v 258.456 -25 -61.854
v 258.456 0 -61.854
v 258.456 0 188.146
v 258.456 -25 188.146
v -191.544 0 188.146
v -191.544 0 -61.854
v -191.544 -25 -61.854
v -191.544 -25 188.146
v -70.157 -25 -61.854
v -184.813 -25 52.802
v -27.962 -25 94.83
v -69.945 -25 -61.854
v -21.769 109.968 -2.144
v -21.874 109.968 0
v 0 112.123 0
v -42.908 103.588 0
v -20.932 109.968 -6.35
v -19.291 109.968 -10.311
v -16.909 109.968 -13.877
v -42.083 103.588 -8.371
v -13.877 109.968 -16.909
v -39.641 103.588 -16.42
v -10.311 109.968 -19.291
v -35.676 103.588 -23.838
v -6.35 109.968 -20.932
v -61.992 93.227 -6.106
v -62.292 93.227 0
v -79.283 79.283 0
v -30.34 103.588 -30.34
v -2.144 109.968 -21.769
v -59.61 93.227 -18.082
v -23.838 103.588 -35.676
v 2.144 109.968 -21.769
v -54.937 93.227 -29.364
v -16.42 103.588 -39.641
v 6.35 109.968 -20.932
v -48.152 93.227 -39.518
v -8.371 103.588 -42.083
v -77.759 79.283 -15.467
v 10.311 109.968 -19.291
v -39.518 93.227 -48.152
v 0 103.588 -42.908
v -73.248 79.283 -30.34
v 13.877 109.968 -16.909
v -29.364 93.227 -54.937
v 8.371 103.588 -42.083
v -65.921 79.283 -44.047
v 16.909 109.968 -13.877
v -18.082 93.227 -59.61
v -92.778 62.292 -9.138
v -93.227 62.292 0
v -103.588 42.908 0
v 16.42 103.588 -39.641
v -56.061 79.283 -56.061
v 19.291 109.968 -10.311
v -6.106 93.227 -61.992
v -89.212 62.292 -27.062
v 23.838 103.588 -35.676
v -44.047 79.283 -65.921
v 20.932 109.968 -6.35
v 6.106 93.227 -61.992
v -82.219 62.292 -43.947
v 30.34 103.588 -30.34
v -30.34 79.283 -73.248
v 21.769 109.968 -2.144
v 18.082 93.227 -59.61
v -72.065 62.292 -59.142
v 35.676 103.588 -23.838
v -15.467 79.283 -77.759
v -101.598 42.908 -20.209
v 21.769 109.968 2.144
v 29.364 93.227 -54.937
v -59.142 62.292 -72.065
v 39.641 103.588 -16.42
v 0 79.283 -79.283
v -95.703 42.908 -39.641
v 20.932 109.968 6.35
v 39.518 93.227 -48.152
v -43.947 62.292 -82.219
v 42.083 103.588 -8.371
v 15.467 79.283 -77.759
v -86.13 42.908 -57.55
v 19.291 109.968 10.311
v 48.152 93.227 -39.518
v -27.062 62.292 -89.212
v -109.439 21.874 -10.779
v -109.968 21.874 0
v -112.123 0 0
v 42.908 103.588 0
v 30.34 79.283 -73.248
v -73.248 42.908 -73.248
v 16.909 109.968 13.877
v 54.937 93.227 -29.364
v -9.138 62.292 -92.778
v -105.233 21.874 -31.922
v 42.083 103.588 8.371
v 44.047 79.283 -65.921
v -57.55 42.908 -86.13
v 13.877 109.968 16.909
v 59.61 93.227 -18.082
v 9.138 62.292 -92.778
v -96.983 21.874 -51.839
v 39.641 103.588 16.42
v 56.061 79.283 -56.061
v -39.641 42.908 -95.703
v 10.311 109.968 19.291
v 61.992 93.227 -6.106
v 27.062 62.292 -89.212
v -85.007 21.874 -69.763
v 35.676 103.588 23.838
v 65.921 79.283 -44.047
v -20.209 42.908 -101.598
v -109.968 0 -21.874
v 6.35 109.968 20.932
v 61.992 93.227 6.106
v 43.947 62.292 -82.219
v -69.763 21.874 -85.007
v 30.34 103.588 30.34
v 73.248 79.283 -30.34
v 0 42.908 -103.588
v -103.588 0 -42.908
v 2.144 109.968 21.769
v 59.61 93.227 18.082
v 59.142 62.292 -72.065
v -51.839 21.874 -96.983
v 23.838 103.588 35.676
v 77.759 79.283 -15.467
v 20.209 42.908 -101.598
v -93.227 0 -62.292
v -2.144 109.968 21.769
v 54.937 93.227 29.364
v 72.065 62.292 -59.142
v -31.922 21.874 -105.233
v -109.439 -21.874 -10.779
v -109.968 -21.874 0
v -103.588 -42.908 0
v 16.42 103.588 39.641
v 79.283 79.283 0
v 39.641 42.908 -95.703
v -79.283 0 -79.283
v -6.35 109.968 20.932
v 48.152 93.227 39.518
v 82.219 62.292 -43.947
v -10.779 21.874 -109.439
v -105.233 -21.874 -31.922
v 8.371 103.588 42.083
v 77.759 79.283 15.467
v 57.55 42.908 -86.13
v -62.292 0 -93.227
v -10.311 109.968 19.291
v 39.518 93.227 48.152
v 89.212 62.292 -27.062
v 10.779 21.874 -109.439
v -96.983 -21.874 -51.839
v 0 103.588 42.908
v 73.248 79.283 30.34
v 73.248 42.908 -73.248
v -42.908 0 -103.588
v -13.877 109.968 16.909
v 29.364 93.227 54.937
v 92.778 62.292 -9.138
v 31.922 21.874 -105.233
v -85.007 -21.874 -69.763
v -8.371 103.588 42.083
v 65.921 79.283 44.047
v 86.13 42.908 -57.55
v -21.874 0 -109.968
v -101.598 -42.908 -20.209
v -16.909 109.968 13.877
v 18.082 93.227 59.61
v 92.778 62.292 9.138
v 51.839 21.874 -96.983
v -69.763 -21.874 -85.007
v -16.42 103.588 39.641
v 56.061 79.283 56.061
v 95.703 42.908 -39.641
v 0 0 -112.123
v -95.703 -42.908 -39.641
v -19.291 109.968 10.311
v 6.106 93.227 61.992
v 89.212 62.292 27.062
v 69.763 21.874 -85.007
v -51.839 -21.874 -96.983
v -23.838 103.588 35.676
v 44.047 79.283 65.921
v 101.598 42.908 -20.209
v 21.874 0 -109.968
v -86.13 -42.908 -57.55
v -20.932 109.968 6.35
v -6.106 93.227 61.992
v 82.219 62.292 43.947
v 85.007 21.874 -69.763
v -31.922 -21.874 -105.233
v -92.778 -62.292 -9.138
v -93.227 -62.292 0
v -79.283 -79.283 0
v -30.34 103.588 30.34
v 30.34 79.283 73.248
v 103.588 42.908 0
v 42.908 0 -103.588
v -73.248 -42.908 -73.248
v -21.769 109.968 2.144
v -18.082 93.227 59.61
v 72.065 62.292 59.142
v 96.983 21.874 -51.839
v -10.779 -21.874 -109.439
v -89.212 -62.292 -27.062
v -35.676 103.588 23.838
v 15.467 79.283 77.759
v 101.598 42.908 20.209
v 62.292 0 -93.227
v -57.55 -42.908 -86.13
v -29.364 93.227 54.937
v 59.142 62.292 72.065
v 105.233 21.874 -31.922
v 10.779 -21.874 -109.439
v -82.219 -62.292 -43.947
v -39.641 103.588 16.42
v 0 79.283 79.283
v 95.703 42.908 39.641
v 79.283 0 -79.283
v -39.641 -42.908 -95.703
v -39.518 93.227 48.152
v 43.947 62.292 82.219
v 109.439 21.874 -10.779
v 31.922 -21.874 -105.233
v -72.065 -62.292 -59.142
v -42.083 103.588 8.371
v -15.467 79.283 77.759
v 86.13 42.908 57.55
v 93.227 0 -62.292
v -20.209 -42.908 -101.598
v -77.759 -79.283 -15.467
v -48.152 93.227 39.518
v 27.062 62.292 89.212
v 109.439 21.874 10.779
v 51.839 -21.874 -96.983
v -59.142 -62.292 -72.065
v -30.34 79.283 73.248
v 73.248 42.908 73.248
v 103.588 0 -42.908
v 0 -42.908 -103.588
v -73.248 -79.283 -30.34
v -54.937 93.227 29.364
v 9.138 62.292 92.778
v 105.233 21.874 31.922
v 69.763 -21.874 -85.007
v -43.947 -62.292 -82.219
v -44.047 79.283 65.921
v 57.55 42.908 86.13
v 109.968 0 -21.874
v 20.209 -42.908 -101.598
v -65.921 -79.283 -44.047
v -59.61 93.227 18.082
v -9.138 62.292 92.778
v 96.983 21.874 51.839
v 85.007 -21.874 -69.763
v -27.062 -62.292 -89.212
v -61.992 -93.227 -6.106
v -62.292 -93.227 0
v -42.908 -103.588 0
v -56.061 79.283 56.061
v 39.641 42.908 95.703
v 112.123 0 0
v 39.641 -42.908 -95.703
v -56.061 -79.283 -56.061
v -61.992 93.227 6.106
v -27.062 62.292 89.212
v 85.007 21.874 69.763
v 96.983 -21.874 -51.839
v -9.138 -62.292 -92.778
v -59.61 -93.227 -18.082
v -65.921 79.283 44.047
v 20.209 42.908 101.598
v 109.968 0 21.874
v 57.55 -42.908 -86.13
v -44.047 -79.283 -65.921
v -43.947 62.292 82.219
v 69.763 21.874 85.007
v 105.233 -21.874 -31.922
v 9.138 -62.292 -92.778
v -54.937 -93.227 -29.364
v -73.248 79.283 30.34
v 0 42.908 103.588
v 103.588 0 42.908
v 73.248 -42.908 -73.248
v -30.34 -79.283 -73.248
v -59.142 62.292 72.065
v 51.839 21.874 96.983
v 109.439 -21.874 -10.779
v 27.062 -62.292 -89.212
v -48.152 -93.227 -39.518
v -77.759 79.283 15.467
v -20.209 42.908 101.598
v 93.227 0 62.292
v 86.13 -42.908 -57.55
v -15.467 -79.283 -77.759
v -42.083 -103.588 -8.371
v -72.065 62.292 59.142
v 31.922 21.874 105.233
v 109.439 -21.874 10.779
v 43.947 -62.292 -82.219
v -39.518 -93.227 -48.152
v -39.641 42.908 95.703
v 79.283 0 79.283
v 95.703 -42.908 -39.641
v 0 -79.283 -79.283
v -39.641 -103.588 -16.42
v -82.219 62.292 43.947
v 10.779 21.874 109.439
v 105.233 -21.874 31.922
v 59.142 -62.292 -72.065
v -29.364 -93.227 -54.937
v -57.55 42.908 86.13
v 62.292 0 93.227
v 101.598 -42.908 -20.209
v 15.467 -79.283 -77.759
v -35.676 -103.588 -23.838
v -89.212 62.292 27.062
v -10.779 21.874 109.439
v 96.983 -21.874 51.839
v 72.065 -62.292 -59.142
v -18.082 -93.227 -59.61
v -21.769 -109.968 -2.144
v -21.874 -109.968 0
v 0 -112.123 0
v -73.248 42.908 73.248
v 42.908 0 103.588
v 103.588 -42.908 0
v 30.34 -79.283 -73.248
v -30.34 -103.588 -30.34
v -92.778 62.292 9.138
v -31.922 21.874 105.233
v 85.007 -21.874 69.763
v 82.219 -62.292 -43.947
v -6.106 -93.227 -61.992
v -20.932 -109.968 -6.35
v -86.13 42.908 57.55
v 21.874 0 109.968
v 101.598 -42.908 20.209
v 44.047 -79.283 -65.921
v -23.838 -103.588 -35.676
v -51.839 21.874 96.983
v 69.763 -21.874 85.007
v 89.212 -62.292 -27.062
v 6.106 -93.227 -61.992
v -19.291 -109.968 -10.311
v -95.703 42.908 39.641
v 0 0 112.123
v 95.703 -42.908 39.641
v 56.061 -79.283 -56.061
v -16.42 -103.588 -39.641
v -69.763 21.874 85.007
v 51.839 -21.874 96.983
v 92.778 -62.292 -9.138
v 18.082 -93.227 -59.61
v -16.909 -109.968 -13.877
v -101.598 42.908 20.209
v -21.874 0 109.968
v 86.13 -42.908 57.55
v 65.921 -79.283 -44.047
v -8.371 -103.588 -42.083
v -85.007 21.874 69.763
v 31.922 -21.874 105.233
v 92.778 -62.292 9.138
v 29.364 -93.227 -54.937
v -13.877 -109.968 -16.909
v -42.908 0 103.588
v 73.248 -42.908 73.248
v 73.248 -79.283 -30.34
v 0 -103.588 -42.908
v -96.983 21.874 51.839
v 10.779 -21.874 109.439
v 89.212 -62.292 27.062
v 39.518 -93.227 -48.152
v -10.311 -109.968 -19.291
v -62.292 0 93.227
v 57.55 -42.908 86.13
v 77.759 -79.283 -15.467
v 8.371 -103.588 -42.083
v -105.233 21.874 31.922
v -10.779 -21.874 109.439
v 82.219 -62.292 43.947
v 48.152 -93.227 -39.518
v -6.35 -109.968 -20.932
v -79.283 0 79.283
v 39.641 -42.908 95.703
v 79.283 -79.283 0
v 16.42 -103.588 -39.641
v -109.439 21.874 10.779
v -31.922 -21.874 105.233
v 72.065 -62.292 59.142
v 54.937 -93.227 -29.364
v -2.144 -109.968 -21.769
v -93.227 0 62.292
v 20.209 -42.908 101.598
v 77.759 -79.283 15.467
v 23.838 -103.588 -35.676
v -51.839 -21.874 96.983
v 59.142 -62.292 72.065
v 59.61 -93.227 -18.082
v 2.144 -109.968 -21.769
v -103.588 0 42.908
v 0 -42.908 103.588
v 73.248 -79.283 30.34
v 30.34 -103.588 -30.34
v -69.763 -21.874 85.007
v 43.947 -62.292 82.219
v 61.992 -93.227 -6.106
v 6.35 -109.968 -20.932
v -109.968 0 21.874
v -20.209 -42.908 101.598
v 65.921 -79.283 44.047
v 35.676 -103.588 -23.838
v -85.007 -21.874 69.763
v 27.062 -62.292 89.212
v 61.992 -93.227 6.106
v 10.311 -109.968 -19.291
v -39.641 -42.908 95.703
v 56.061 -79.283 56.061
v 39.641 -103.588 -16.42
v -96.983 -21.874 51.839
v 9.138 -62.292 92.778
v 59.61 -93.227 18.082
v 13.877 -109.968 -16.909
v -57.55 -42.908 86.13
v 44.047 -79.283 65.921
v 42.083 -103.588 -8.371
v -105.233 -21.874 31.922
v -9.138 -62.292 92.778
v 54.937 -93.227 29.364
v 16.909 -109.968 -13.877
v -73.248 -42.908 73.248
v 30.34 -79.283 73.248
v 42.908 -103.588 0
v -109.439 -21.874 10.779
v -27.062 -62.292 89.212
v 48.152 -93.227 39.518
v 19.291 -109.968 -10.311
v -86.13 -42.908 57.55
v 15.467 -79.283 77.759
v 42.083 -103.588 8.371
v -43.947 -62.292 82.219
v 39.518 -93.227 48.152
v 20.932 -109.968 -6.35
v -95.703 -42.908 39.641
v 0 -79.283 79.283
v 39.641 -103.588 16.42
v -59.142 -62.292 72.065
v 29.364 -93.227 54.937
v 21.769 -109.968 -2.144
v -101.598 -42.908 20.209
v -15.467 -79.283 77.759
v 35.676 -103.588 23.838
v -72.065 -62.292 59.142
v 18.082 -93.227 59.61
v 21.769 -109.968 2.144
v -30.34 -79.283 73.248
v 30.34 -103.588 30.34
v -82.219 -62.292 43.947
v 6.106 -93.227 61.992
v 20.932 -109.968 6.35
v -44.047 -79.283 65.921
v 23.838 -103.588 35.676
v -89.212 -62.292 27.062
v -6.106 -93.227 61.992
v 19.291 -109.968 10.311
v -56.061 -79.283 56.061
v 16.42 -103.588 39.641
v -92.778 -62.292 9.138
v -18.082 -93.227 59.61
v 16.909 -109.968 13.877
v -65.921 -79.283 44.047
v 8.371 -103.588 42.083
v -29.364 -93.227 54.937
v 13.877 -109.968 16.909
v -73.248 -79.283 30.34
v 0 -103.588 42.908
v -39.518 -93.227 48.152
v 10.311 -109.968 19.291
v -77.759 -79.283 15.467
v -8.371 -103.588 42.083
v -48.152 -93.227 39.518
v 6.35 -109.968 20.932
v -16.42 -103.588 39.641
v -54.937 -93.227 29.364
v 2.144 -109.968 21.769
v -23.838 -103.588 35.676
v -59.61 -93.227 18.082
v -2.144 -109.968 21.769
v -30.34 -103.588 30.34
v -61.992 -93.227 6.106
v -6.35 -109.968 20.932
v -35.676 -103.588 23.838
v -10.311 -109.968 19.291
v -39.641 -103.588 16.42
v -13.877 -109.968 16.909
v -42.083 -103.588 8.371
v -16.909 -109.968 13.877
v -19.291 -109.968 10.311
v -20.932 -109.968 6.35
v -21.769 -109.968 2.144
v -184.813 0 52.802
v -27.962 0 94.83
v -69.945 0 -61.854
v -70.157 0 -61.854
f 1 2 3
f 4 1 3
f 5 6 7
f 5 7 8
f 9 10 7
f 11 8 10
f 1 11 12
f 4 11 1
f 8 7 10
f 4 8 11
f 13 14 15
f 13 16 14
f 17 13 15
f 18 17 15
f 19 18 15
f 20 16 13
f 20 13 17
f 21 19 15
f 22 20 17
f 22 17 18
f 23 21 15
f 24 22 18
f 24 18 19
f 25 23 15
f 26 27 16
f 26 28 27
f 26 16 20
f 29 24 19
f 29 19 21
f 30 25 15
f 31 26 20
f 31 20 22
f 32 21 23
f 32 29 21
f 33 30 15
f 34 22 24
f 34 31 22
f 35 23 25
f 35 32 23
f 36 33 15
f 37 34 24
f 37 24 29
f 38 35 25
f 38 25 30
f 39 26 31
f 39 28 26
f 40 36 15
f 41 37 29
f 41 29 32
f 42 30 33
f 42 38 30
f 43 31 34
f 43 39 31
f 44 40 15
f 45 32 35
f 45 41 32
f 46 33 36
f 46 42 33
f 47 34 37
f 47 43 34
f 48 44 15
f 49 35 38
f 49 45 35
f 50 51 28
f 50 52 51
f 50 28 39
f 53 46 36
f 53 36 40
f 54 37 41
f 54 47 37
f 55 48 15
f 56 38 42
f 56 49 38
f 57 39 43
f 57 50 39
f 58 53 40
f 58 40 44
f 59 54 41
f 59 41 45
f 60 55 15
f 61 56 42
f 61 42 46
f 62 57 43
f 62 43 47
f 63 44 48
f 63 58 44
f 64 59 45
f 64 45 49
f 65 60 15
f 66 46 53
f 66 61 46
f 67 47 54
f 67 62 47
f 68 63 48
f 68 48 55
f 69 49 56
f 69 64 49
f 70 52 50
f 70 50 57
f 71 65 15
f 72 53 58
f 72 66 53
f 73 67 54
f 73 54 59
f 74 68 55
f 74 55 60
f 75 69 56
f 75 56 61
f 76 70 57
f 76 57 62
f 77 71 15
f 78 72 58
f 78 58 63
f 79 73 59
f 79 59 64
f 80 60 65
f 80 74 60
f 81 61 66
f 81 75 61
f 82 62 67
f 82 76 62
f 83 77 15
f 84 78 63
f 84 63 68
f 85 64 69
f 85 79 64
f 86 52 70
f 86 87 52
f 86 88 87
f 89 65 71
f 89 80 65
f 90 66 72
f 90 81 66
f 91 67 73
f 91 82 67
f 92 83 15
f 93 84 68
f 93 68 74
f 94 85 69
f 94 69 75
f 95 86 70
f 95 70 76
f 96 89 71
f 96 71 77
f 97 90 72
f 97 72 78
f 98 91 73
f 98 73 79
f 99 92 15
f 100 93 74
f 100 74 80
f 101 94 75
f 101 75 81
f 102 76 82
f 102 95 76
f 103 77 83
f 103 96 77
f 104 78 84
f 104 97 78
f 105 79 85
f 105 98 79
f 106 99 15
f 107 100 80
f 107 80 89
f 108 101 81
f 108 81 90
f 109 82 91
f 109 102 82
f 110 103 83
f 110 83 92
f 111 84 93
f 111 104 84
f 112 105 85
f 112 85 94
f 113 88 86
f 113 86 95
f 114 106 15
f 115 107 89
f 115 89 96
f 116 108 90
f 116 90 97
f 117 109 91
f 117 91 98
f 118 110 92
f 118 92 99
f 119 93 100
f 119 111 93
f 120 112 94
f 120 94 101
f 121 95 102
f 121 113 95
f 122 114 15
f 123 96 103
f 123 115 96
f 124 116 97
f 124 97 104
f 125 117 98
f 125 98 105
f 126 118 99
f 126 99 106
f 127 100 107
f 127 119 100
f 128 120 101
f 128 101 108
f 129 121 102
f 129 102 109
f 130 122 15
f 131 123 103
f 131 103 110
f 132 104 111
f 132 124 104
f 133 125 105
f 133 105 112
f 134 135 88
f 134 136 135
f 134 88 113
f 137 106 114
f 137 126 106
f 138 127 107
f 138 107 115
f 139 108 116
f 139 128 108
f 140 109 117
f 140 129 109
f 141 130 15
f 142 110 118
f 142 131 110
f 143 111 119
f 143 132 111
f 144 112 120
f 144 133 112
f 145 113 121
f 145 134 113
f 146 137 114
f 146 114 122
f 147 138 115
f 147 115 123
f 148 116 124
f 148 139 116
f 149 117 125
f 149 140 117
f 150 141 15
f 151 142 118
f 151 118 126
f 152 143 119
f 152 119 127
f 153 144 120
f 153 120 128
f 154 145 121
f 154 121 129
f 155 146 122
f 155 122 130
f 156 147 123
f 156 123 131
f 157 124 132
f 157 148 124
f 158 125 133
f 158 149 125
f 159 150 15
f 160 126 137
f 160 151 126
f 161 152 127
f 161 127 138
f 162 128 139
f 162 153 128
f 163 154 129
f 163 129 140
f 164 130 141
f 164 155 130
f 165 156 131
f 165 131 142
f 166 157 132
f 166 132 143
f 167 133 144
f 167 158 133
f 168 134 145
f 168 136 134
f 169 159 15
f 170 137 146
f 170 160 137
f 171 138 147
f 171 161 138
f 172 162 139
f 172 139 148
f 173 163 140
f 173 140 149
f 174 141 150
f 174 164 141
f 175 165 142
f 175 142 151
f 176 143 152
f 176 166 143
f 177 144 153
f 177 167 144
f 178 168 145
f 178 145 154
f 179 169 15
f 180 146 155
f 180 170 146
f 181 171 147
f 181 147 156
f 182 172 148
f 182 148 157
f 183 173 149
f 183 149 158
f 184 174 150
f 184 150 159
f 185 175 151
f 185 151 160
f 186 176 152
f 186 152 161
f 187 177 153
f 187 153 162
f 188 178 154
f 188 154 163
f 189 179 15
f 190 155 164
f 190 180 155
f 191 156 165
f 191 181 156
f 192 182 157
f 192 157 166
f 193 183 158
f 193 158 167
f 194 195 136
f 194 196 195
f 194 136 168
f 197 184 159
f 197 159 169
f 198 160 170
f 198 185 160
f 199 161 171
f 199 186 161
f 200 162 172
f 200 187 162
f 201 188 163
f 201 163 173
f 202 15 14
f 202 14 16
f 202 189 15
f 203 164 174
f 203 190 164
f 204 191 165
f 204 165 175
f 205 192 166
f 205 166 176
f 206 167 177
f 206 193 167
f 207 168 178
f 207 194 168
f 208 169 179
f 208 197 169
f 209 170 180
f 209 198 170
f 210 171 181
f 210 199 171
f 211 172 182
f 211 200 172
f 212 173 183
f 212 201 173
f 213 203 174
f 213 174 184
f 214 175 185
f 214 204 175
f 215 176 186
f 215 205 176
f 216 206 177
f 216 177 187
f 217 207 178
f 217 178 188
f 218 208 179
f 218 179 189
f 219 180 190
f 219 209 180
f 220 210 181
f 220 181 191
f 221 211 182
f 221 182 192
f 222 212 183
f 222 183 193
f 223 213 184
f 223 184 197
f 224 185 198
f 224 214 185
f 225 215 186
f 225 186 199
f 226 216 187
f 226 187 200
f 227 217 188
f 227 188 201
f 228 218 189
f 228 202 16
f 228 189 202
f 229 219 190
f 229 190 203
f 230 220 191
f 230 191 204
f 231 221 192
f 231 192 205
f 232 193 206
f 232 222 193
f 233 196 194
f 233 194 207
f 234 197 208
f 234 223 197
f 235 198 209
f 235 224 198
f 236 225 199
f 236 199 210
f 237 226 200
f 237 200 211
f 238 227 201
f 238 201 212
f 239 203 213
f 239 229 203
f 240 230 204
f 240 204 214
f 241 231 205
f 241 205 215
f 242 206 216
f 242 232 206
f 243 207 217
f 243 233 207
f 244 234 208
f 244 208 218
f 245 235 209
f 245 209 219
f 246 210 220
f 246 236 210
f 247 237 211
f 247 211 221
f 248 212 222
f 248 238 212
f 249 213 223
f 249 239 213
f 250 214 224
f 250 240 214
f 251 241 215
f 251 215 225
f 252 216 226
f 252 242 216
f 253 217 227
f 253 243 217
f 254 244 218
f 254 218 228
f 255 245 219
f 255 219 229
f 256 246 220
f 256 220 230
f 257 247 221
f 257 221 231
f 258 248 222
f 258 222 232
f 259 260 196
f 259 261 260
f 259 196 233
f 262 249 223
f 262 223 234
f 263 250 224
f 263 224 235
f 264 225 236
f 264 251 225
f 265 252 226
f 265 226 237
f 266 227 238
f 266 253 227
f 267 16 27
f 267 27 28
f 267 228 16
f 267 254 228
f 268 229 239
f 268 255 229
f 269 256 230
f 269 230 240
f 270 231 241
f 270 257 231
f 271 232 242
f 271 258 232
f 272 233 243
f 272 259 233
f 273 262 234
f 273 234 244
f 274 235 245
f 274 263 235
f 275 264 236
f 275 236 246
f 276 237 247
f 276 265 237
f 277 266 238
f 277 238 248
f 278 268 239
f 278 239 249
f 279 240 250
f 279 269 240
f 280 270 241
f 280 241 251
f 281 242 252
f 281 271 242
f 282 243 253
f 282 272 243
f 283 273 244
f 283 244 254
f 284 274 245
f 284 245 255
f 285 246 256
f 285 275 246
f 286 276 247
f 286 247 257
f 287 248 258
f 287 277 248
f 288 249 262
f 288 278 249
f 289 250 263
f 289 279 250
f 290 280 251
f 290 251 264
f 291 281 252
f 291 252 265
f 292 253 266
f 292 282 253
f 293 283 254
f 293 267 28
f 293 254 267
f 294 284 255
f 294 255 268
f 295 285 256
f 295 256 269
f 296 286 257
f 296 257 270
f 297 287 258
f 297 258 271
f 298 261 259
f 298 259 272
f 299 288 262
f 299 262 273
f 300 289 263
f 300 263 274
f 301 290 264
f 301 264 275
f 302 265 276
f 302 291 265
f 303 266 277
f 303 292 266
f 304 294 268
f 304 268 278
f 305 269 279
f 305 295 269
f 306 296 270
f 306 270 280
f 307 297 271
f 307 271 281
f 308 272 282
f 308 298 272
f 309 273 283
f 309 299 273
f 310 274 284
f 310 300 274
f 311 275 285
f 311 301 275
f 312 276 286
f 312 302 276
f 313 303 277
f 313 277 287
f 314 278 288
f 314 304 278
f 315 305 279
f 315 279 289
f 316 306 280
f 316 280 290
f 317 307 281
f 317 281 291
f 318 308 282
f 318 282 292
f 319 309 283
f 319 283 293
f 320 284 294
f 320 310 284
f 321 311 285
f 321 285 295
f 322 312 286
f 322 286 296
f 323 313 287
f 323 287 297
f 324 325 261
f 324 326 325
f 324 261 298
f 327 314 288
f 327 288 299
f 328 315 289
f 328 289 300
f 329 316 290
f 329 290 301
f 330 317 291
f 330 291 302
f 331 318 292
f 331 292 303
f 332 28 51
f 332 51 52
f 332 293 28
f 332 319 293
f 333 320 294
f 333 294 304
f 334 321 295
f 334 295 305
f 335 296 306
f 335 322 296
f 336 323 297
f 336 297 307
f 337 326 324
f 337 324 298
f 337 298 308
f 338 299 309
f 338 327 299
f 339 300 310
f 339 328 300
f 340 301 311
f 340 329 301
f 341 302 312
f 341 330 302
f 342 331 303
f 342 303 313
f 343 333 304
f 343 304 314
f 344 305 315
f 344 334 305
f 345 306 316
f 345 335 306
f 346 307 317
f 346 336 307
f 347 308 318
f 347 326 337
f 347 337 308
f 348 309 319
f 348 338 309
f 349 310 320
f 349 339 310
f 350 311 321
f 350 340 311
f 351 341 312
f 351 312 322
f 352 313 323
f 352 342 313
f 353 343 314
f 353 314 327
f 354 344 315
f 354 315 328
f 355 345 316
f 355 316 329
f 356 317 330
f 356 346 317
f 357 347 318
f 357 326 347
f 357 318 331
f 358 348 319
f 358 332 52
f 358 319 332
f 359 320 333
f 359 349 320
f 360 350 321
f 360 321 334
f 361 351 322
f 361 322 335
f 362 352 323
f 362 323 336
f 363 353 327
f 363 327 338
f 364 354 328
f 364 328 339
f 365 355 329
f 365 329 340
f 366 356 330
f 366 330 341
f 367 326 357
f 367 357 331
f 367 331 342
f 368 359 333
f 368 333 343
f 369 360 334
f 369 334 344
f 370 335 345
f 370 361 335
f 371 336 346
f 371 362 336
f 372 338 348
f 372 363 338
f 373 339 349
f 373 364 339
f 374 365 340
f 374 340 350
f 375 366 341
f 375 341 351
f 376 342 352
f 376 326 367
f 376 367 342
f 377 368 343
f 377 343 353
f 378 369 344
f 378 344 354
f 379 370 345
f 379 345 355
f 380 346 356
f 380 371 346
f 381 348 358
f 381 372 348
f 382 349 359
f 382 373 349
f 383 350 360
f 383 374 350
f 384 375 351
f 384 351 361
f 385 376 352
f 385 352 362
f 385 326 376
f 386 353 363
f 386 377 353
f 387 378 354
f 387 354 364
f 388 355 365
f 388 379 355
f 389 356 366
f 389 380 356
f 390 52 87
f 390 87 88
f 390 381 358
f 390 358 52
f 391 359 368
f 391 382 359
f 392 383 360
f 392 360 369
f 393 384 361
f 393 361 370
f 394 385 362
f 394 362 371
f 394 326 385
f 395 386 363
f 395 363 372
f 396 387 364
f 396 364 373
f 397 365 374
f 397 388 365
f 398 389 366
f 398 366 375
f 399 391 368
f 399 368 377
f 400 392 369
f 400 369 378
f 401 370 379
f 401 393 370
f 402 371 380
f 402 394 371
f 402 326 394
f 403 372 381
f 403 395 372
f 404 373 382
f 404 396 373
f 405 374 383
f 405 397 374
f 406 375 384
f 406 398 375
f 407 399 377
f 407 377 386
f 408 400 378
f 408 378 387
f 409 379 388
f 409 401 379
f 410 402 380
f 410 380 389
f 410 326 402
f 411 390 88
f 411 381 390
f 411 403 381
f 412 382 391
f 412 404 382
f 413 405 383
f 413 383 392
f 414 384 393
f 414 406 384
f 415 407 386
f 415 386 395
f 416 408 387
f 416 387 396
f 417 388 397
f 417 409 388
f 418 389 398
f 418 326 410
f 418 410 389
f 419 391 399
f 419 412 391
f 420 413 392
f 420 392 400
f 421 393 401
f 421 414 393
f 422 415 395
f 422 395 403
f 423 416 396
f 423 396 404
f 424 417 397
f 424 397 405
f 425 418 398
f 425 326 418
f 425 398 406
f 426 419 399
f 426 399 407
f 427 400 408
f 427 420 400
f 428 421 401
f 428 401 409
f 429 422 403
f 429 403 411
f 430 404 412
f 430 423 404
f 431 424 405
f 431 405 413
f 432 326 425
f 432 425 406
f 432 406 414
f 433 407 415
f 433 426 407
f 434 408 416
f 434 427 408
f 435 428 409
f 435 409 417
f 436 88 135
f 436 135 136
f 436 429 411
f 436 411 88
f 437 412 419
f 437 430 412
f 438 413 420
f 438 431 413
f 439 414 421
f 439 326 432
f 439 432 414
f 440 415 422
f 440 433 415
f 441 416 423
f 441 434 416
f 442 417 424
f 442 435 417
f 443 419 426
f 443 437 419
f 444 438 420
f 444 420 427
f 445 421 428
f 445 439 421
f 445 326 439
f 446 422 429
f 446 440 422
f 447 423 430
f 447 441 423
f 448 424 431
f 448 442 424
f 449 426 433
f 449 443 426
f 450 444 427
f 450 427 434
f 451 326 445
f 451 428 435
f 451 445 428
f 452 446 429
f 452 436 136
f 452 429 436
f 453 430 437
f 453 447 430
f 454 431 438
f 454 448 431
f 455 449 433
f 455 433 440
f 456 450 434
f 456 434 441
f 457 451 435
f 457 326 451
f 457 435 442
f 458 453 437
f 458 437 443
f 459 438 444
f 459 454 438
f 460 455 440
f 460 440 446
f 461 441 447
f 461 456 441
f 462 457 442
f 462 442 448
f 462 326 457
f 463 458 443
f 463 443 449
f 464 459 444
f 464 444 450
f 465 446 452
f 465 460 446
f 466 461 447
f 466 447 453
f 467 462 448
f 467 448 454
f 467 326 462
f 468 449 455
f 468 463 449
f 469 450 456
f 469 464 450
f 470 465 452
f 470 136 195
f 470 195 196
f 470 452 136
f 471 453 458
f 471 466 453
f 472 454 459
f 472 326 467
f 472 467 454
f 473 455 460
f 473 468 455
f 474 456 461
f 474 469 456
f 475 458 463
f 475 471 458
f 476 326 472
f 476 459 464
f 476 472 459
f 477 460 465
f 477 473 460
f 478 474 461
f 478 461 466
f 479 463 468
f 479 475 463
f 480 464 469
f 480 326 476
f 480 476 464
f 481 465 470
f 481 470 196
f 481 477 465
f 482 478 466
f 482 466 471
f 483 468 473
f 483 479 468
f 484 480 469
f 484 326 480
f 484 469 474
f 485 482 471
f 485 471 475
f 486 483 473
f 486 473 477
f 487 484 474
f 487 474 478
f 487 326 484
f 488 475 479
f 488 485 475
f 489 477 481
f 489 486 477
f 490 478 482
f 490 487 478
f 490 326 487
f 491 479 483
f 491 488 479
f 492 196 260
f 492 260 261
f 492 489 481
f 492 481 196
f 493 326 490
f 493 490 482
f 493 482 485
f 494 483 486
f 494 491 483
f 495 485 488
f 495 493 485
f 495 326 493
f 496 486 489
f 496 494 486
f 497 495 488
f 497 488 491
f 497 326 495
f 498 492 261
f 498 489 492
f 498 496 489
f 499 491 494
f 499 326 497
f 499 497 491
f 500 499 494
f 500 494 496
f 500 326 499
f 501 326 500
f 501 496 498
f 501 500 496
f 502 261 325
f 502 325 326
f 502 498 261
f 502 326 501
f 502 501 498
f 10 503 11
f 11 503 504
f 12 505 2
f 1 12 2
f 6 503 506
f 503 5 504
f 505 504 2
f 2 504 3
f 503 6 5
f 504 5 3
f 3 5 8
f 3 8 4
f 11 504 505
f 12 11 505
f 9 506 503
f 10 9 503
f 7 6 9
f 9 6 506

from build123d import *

# Parameters (mm, degrees)
F0_W     = 450
F0_H     = 250
F1_DEPTH = 25
F3_DEPTH = 50


with BuildPart() as f1:
    # F0 (on Front) → F1 (new body)
    with BuildSketch(Plane.XZ):
        with Locations((33.456496, 63.145977)):
            Rectangle(F0_W, F0_H)
    extrude(amount=F1_DEPTH)

    # F2 (on face) → F3 (cut)
    with BuildSketch(Plane(origin=(0, 0, 0), x_dir=(-1, 0, 0), z_dir=(0, 1, 0))):
        Polygon((70.156518, -61.854023), (184.812616, 52.802063), (27.961932, 94.830086), (69.945304, -61.854023), align=None)
    extrude(amount=-F3_DEPTH, mode=Mode.SUBTRACT)


with BuildPart() as f5:
    # F4 (on Top) → F5 (revolve)
    with BuildSketch(Plane.XY):
        with BuildLine():
            Line((0, 0), (0, 112.122815))
            ThreePointArc((0, 112.122815), (-112.122815, 0), (0, -112.122815))
            Line((0, -112.122815), (0, 0))
        make_face()
    revolve(axis=Axis((0, -56.061408, 0), (0, -1, 0)))


solid = Compound([f1.part, f5.part])
